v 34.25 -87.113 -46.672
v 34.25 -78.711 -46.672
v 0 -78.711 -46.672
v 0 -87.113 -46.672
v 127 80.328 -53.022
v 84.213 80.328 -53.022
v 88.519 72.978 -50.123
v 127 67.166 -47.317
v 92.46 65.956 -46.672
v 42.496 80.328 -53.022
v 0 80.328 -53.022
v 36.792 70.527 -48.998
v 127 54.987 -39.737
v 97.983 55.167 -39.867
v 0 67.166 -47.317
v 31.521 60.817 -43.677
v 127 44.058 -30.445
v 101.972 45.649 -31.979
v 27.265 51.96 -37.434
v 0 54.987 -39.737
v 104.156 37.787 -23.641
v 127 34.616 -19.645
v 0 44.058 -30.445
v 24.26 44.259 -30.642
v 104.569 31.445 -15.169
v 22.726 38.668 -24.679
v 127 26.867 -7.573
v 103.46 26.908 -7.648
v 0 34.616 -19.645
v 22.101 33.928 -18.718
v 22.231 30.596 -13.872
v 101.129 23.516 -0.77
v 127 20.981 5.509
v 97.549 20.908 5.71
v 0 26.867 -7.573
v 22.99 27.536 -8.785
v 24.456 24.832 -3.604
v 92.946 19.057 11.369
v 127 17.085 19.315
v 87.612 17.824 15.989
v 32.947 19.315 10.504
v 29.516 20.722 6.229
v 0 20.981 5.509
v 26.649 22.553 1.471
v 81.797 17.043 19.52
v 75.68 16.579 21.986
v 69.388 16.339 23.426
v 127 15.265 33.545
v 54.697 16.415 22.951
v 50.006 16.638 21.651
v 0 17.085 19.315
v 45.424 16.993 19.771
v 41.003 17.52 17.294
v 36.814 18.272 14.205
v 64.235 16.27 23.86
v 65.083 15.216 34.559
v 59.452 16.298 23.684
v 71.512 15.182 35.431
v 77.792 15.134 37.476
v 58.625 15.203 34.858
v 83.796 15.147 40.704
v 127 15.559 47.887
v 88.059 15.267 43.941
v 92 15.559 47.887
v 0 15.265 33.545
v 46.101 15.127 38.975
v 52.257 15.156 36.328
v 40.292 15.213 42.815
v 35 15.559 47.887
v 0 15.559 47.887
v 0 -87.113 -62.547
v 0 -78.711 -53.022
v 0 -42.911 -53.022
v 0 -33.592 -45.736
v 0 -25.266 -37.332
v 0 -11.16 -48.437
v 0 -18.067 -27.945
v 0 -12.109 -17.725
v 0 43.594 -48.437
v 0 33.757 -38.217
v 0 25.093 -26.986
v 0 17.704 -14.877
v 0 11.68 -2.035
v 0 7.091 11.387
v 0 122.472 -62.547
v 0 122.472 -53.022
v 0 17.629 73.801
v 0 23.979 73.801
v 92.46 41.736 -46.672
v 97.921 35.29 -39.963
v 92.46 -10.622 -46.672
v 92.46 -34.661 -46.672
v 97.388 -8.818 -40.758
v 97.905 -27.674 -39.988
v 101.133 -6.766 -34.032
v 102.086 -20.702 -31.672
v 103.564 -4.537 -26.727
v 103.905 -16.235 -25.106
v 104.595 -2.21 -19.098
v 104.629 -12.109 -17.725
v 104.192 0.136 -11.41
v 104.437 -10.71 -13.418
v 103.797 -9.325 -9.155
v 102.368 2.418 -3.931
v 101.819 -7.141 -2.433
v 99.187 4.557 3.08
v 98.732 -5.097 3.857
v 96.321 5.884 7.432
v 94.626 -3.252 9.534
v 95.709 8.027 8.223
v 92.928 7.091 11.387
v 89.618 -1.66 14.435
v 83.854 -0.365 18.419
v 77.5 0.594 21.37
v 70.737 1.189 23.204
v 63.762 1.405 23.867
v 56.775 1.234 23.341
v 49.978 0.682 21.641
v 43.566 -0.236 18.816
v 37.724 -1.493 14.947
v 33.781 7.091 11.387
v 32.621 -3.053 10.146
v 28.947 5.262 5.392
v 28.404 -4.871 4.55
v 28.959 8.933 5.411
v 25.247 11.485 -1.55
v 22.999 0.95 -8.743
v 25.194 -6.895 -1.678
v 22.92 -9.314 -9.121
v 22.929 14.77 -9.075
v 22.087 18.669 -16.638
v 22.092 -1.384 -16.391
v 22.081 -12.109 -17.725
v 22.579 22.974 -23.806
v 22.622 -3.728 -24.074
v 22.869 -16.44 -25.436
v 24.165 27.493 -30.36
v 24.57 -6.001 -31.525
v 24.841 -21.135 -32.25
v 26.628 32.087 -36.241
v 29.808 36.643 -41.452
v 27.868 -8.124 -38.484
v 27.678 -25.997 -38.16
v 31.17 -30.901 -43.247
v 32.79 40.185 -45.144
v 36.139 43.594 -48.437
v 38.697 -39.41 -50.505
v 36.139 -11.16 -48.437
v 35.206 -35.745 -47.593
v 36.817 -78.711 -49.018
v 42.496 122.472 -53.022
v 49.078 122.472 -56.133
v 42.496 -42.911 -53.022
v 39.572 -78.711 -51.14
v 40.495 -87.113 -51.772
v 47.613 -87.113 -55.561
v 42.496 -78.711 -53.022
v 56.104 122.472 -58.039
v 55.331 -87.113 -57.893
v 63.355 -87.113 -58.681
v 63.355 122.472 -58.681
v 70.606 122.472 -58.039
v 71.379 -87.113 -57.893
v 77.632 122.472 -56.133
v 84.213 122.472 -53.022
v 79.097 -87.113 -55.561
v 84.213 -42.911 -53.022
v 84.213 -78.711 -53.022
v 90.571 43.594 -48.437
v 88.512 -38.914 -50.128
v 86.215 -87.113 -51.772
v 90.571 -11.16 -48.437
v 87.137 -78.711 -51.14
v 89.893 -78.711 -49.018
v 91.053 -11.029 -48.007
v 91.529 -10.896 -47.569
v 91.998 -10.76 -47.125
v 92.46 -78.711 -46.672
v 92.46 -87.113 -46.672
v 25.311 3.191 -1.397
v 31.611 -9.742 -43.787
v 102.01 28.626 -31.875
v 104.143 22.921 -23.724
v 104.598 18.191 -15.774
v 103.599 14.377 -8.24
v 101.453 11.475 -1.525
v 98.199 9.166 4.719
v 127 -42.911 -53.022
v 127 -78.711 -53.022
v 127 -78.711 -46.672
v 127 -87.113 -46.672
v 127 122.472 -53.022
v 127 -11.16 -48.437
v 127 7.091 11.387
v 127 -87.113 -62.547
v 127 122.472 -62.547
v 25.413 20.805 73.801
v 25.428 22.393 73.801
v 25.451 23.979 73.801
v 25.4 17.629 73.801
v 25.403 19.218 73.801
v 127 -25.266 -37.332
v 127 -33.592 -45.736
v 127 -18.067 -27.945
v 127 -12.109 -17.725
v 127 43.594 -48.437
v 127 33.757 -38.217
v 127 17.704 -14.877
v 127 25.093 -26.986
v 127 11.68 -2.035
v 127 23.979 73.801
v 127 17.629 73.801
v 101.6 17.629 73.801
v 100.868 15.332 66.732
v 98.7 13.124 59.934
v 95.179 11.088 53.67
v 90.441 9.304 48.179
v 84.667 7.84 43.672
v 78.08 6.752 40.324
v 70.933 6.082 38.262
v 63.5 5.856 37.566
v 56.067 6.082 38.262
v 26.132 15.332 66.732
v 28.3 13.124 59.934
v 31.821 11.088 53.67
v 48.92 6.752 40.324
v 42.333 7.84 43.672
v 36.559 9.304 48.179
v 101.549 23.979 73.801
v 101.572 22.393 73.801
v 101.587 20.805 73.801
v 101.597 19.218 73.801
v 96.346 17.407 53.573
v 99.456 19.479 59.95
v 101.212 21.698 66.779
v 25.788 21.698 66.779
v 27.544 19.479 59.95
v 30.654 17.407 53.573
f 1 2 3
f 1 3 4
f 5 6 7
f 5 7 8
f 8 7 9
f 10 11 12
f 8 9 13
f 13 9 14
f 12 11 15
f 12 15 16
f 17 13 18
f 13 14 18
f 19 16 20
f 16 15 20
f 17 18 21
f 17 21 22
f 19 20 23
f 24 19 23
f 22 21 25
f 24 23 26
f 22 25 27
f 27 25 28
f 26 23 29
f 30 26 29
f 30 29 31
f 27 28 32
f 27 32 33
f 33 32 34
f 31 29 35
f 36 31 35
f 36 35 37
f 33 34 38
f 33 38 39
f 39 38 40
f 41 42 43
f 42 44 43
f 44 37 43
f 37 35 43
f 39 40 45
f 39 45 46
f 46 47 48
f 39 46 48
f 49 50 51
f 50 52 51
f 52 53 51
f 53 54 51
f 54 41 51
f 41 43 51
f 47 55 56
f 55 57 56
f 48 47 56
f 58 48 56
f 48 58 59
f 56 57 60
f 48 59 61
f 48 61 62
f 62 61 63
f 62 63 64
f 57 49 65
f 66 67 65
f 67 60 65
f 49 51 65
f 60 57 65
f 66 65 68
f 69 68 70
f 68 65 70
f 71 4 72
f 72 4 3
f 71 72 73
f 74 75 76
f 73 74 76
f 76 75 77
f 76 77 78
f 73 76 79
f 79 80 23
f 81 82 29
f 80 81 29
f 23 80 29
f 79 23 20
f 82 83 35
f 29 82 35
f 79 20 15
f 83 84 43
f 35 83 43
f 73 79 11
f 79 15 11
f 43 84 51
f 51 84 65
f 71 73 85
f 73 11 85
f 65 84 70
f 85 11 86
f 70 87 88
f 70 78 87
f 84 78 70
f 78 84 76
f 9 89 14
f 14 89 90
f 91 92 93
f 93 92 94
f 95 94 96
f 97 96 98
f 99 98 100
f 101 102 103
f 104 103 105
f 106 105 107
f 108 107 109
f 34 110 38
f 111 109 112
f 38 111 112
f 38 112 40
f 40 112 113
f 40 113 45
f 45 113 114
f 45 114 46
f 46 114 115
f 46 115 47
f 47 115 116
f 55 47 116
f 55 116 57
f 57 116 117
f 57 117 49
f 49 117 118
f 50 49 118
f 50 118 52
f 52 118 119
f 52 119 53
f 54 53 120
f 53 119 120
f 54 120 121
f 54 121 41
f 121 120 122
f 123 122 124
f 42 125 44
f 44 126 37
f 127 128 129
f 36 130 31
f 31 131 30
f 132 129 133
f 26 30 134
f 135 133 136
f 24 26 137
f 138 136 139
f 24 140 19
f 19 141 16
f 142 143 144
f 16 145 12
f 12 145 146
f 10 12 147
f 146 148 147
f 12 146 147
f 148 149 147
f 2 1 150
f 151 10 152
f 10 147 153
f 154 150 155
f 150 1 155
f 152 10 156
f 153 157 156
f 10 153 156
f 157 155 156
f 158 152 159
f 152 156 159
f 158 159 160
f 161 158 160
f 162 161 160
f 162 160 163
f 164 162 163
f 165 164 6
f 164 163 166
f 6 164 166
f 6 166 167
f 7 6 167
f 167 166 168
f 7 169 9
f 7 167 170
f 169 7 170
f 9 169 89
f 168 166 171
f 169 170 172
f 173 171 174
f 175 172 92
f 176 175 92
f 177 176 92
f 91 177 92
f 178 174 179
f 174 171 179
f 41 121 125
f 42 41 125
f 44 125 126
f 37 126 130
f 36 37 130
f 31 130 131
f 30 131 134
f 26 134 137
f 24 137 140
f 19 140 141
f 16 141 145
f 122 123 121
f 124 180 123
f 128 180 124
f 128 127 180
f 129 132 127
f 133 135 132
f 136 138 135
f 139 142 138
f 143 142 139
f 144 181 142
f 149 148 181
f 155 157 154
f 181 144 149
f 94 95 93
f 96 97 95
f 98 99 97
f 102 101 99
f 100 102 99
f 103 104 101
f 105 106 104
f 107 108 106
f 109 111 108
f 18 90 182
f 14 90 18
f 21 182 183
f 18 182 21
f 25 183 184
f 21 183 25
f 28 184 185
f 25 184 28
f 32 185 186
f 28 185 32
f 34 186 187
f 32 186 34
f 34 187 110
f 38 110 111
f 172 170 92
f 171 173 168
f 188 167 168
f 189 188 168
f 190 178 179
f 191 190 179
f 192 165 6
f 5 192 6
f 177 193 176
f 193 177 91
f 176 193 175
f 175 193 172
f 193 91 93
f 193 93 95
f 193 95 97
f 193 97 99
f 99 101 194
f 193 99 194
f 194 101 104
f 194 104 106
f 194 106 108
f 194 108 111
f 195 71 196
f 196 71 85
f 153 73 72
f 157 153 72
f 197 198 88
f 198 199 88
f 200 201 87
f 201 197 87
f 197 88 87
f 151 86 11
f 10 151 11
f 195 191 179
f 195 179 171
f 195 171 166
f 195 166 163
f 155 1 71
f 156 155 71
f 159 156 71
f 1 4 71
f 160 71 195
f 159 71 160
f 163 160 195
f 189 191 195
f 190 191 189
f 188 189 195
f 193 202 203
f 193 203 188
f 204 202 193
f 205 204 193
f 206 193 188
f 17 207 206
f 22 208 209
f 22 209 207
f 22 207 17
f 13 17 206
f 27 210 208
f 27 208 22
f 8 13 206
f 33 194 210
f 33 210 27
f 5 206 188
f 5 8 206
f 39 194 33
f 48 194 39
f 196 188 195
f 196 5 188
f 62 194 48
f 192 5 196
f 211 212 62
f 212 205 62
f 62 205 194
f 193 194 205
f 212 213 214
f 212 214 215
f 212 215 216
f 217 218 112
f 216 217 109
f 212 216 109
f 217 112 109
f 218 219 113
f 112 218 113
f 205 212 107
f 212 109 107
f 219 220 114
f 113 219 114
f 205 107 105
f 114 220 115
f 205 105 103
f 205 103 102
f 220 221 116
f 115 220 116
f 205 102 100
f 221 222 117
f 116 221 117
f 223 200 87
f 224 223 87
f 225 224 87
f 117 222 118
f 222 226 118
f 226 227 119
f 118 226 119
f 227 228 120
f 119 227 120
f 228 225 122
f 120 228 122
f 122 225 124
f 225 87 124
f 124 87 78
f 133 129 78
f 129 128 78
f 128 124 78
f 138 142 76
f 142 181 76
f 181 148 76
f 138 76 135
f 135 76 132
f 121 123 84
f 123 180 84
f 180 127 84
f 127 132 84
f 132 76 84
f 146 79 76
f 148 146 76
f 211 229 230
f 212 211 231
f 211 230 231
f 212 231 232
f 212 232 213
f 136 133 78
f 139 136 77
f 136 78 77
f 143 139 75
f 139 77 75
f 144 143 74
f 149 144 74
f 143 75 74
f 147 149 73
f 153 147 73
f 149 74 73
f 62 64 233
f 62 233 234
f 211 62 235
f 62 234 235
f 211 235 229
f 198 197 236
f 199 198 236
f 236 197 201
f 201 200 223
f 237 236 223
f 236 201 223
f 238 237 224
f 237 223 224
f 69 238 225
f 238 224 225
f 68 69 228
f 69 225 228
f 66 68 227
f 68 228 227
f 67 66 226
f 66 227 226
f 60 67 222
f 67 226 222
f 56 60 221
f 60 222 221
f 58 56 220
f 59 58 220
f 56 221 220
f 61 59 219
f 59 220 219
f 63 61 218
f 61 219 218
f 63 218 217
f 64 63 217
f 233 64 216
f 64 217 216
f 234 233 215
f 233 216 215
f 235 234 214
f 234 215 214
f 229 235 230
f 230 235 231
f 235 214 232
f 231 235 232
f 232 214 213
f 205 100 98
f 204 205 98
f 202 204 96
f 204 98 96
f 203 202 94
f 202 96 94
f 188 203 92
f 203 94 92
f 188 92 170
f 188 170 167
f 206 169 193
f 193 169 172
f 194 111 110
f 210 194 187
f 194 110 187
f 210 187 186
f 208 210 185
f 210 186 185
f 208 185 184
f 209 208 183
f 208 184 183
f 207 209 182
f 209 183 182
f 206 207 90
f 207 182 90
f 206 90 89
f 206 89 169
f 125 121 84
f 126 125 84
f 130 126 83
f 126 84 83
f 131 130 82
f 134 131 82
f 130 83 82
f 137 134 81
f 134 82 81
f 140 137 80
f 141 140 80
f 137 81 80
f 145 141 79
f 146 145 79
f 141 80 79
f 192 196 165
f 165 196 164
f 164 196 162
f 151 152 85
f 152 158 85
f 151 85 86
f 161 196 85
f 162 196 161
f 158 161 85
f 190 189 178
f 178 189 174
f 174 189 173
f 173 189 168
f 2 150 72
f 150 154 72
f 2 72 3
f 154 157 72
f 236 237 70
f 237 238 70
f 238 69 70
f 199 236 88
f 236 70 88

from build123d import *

# Parameters (mm, degrees)
F1_DEPTH = 127
F2_DEPTH = 127
F3_DEPTH = 127
F4_DEPTH = 127
F5_DEPTH = 127
F7_DEPTH = 114.3
F9_DEPTH = 215.9


# Not quite as in the source:
# - a feature names something its author has since deleted; it is built from what else it names


with BuildPart() as f1:
    # F0 (on Right) → F1 (new body)
    with BuildSketch(Plane.YZ):
        Polygon((-23.5780230826, -53.0224030194), (-17.2280230826, -53.0224030194), (15.5594434607, 47.8870429867), (23.9793931173, 73.8009834286), (17.6293931173, 73.8009834286), (-12.109174605, -17.7249168697), align=None)
        Polygon((-80.7280230826, -53.0224030194), (-80.7280230826, -62.5474030194), (122.4719769174, -62.5474030194), (122.4719769174, -53.0224030194), (80.3280323744, -53.0224030194), (-17.2280230826, -53.0224030194), (-23.5780230826, -53.0224030194), (-42.9109744728, -53.0224030194), (-78.7108764052, -53.0224030194), align=None)
    extrude(amount=F1_DEPTH)

    # F0 (on Right) → F2 (join)
    with BuildSketch(Plane.YZ):
        with BuildLine():
            Line((-17.2280230826, -53.0224030194), (80.3280323744, -53.0224030194))
            ThreePointArc((80.3280323744, -53.0224030194), (30.5185291001, -13.7520262922), (15.5594434607, 47.8870429867))
            Line((15.5594434607, 47.8870429867), (-17.2280230826, -53.0224030194))
        make_face()
        with BuildLine():
            Line((-11.1604323611, -48.4367646277), (7.0909718052, 11.3872801885))
            ThreePointArc((7.0909718052, 11.3872801885), (21.2331642185, -21.0320576084), (43.5937792063, -48.4367646277))
            Line((43.5937792063, -48.4367646277), (-11.1604323611, -48.4367646277))
        make_face(mode=Mode.SUBTRACT)
    extrude(amount=F2_DEPTH)

    # F0 (on Right) → F3 (cut)
    with BuildSketch(Plane.YZ):
        with BuildLine():
            ThreePointArc((43.5937792063, -48.4367646277), (21.2331642185, -21.0320576084), (7.0909718052, 11.3872801885))
            Line((7.0909718052, 11.3872801885), (-11.1604323611, -48.4367646277))
            Line((-11.1604323611, -48.4367646277), (43.5937792063, -48.4367646277))
        make_face()
    extrude(amount=-F3_DEPTH, mode=Mode.SUBTRACT)

    # F0 (on Right) → F4 (join)
    with BuildSketch(Plane.YZ):
        with BuildLine():
            ThreePointArc((-12.109174605, -17.7249168697), (-25.2658938129, -37.3320091963), (-42.9109744728, -53.0224030194))
            Line((-42.9109744728, -53.0224030194), (-23.5780230826, -53.0224030194))
            Line((-23.5780230826, -53.0224030194), (-12.109174605, -17.7249168697))
        make_face()
    extrude(amount=F4_DEPTH)

    # F0 (on Right) → F5 (join)
    with BuildSketch(Plane.YZ):
        Polygon((-87.1128812432, -62.5474030194), (-80.7280230826, -62.5474030194), (-80.7280230826, -53.0224030194), (-78.7108764052, -53.0224030194), (-78.7108764052, -46.6724030194), (-87.1128812432, -46.6724030194), align=None)
    extrude(amount=F5_DEPTH)

    # F6 (on face) → F7 (cut)
    with BuildSketch(Plane(origin=(0, -5.7436289571, 1.866218176), x_dir=(1, 0, 0), z_dir=(0, -0.9510565163, 0.3090169944))):
        with BuildLine():
            ThreePointArc((25.4, 75.6366882725), (63.5, 37.5366882725), (101.6, 75.6366882725))
            Line((101.6, 75.6366882725), (25.4, 75.6366882725))
        make_face()
        with BuildLine():
            Line((25.4, 75.6366882725), (101.6, 75.6366882725))
            ThreePointArc((101.6, 75.6366882725), (63.5, 113.7366882725), (25.4, 75.6366882725))
        make_face()
    extrude(amount=-F7_DEPTH, mode=Mode.SUBTRACT)

    # F8 (on face) → F9 (cut)
    with BuildSketch(Plane.XZ.offset(87.1128812432)):
        with BuildLine():
            Line((92.459596055, -46.6724030194), (34.2501482793, -46.6724030194))
            ThreePointArc((34.2501482793, -46.6724030194), (63.3548721671, -58.6806869), (92.459596055, -46.6724030194))
        make_face()
        with BuildLine():
            ThreePointArc((92.459596055, -46.6724030194), (101.4660457483, -33.2538436782), (104.6298721671, -17.4056869))
            ThreePointArc((104.6298721671, -17.4056869), (47.506715389, 20.7054866812), (34.2501482793, -46.6724030194))
            Line((34.2501482793, -46.6724030194), (92.459596055, -46.6724030194))
        make_face()
    extrude(amount=-F9_DEPTH, mode=Mode.SUBTRACT)


solid = f1.part
